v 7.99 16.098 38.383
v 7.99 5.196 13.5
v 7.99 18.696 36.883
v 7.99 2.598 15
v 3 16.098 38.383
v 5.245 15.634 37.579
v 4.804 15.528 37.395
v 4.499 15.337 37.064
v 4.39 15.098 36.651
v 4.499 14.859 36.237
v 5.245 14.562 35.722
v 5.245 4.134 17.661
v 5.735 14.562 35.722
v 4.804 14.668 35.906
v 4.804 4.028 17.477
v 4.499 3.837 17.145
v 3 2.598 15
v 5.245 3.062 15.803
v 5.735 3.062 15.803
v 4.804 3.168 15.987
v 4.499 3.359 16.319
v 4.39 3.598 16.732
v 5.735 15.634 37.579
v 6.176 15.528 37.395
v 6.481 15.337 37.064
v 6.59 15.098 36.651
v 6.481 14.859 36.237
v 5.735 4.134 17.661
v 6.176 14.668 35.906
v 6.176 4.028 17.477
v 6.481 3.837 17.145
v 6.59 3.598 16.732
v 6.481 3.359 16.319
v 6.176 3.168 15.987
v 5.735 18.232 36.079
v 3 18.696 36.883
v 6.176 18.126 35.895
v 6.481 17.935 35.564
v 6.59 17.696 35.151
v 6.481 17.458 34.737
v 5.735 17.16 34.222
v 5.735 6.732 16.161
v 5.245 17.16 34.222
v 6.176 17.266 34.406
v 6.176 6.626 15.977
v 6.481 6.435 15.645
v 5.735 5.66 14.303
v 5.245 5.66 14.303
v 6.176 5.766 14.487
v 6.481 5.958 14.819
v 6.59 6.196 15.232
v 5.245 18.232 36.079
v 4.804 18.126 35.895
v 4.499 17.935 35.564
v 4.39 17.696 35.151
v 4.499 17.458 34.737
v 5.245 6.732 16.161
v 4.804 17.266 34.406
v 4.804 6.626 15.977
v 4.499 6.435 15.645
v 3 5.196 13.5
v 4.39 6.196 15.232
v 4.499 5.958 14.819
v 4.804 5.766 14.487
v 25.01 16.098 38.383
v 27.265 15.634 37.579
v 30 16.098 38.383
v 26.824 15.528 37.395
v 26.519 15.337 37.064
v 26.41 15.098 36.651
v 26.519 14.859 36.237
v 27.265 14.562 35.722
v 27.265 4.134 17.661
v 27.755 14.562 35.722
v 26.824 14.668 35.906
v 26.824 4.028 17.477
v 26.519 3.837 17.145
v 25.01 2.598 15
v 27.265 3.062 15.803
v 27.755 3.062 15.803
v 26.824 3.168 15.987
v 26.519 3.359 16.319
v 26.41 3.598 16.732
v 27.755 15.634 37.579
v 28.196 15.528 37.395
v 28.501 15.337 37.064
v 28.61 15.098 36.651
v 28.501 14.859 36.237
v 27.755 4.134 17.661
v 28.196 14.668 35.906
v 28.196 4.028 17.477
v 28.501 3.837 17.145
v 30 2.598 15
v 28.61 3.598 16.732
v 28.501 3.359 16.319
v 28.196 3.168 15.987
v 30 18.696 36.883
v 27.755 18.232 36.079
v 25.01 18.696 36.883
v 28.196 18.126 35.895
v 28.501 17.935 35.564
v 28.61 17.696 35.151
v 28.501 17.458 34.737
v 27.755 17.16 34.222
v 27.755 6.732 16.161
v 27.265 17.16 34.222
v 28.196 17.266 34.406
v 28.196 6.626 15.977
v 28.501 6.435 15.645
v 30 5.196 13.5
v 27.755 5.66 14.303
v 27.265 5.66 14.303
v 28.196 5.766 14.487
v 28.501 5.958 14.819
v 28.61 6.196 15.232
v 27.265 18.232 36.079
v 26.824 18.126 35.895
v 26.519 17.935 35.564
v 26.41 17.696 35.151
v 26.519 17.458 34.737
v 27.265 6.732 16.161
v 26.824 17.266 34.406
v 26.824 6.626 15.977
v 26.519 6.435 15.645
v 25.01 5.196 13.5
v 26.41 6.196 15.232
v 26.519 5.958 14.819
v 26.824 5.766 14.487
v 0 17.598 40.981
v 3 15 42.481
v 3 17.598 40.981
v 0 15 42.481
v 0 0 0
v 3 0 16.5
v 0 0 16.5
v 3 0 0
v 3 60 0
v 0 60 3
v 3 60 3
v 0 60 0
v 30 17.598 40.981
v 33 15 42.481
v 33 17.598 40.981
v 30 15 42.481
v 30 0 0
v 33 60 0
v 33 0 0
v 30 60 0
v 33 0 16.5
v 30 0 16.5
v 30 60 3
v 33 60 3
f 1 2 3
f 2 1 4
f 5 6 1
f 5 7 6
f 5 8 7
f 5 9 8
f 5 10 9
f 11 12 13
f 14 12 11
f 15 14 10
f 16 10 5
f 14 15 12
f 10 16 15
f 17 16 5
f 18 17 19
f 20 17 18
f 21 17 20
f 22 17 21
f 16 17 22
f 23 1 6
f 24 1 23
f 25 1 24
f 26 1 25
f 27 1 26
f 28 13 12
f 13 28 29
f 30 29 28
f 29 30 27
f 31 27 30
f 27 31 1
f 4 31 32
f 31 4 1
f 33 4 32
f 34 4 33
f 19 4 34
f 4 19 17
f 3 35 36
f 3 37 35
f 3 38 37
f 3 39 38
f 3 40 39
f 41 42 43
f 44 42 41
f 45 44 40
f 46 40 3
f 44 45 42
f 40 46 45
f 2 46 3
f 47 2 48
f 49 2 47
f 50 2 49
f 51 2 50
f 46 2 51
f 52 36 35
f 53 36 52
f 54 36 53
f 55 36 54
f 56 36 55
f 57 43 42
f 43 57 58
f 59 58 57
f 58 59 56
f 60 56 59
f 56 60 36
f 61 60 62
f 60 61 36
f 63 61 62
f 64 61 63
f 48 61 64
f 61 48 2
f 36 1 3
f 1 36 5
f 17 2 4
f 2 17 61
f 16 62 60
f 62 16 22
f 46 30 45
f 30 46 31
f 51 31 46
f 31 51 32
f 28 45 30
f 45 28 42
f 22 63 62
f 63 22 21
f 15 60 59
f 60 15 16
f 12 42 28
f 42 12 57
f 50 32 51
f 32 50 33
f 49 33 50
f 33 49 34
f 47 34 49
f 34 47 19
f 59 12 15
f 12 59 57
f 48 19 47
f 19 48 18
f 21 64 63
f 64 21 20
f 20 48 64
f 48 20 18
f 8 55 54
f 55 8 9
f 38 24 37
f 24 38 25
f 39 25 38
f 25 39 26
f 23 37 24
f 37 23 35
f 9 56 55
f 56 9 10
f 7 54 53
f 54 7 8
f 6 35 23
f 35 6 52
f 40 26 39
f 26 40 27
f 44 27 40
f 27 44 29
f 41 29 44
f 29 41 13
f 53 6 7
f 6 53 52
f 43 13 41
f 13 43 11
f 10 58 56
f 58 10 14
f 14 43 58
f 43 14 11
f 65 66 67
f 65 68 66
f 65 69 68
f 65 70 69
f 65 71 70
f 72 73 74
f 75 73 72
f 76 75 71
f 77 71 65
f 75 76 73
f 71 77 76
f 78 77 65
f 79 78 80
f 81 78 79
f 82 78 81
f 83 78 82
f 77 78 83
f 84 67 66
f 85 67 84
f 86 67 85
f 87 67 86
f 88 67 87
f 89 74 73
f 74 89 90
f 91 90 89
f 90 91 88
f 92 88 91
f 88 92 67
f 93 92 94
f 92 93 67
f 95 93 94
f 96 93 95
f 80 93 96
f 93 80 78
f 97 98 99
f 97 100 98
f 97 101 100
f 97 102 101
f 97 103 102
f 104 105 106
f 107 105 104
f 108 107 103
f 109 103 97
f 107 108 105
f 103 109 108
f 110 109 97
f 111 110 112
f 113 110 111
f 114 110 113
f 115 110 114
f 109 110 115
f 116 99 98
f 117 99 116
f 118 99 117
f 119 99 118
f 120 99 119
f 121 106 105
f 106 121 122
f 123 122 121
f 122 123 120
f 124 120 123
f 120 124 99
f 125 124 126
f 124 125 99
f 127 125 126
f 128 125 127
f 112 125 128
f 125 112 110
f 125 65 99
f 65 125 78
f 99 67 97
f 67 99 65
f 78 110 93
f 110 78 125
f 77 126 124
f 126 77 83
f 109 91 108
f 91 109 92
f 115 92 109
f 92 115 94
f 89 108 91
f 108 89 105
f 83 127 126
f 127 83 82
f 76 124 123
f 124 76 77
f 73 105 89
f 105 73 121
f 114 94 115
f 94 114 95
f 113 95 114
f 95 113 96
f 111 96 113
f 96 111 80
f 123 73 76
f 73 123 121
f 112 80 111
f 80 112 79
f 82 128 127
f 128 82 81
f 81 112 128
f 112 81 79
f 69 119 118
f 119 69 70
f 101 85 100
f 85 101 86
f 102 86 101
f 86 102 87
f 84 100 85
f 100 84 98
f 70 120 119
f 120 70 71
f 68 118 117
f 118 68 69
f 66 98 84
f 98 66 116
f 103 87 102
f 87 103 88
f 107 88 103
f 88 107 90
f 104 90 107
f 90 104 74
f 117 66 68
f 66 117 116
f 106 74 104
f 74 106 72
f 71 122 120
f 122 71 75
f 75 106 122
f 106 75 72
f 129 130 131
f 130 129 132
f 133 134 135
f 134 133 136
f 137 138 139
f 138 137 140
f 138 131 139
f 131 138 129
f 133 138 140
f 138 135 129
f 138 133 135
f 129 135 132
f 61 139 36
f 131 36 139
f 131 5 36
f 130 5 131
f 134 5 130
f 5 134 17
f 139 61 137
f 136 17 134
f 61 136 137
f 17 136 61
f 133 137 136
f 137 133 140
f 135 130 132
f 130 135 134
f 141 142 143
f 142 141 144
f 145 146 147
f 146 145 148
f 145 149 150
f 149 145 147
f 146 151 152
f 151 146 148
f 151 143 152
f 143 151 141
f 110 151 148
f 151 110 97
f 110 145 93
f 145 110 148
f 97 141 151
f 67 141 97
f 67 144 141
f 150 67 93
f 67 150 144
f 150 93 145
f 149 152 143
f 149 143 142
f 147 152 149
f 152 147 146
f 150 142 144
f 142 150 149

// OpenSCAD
$fs=.5;

module front_panel(width=3) {
    translate([0,0,0])
        cube([width, 30, 3]);
}

module button_hole() {
    cylinder(80, d=16, center=true);
    rear_clearance_depth = 10;
    translate([0, 0, -2 - rear_clearance_depth])
        cylinder(rear_clearance_depth*2, d=20, center=true);
}

module button_holes() {
    x_spacing = 25;
    x_offset = x_spacing / 2;
    y_offset = 30/2;
    for(i = [0:4]) {
        translate([x_offset + x_spacing * i, y_offset, 0 ])
            button_hole();
    }
}

top_slope = 60;
front_height = 15;


module side_support() {
    hull()
        union() {
            translate([0, cos(90-top_slope)*3, front_height])
                rotate([top_slope, 0, 0])
                    front_panel();

            scale([1, 2, 1])
                front_panel();

            translate([0, 3, 0])
            scale([1, 1, (front_height + 3*cos(top_slope))/30])
                rotate([90, 0, 0])
                    front_panel();
    }
}
module ridge_for_faceplate(width=3) {
    translate([0, cos(90-top_slope)*6, front_height-sin(90-top_slope)*3])
        rotate([top_slope, 0, 0])
            difference() {
                scale([1, .9, 1])
                    front_panel(width);
                translate([width/2, 2, -.01])
                    cylinder(5, d=2.2);
                translate([width/2, 25, -.01])
                    cylinder(5, d=2.2);
            }
}

// left side
side_support();
translate([3 - .01, 0, 0])
    ridge_for_faceplate(5);

// right side
translate([30, 0, 0])
    side_support();
translate([30 - 5 + .01, 0, 0])
    ridge_for_faceplate(5);
